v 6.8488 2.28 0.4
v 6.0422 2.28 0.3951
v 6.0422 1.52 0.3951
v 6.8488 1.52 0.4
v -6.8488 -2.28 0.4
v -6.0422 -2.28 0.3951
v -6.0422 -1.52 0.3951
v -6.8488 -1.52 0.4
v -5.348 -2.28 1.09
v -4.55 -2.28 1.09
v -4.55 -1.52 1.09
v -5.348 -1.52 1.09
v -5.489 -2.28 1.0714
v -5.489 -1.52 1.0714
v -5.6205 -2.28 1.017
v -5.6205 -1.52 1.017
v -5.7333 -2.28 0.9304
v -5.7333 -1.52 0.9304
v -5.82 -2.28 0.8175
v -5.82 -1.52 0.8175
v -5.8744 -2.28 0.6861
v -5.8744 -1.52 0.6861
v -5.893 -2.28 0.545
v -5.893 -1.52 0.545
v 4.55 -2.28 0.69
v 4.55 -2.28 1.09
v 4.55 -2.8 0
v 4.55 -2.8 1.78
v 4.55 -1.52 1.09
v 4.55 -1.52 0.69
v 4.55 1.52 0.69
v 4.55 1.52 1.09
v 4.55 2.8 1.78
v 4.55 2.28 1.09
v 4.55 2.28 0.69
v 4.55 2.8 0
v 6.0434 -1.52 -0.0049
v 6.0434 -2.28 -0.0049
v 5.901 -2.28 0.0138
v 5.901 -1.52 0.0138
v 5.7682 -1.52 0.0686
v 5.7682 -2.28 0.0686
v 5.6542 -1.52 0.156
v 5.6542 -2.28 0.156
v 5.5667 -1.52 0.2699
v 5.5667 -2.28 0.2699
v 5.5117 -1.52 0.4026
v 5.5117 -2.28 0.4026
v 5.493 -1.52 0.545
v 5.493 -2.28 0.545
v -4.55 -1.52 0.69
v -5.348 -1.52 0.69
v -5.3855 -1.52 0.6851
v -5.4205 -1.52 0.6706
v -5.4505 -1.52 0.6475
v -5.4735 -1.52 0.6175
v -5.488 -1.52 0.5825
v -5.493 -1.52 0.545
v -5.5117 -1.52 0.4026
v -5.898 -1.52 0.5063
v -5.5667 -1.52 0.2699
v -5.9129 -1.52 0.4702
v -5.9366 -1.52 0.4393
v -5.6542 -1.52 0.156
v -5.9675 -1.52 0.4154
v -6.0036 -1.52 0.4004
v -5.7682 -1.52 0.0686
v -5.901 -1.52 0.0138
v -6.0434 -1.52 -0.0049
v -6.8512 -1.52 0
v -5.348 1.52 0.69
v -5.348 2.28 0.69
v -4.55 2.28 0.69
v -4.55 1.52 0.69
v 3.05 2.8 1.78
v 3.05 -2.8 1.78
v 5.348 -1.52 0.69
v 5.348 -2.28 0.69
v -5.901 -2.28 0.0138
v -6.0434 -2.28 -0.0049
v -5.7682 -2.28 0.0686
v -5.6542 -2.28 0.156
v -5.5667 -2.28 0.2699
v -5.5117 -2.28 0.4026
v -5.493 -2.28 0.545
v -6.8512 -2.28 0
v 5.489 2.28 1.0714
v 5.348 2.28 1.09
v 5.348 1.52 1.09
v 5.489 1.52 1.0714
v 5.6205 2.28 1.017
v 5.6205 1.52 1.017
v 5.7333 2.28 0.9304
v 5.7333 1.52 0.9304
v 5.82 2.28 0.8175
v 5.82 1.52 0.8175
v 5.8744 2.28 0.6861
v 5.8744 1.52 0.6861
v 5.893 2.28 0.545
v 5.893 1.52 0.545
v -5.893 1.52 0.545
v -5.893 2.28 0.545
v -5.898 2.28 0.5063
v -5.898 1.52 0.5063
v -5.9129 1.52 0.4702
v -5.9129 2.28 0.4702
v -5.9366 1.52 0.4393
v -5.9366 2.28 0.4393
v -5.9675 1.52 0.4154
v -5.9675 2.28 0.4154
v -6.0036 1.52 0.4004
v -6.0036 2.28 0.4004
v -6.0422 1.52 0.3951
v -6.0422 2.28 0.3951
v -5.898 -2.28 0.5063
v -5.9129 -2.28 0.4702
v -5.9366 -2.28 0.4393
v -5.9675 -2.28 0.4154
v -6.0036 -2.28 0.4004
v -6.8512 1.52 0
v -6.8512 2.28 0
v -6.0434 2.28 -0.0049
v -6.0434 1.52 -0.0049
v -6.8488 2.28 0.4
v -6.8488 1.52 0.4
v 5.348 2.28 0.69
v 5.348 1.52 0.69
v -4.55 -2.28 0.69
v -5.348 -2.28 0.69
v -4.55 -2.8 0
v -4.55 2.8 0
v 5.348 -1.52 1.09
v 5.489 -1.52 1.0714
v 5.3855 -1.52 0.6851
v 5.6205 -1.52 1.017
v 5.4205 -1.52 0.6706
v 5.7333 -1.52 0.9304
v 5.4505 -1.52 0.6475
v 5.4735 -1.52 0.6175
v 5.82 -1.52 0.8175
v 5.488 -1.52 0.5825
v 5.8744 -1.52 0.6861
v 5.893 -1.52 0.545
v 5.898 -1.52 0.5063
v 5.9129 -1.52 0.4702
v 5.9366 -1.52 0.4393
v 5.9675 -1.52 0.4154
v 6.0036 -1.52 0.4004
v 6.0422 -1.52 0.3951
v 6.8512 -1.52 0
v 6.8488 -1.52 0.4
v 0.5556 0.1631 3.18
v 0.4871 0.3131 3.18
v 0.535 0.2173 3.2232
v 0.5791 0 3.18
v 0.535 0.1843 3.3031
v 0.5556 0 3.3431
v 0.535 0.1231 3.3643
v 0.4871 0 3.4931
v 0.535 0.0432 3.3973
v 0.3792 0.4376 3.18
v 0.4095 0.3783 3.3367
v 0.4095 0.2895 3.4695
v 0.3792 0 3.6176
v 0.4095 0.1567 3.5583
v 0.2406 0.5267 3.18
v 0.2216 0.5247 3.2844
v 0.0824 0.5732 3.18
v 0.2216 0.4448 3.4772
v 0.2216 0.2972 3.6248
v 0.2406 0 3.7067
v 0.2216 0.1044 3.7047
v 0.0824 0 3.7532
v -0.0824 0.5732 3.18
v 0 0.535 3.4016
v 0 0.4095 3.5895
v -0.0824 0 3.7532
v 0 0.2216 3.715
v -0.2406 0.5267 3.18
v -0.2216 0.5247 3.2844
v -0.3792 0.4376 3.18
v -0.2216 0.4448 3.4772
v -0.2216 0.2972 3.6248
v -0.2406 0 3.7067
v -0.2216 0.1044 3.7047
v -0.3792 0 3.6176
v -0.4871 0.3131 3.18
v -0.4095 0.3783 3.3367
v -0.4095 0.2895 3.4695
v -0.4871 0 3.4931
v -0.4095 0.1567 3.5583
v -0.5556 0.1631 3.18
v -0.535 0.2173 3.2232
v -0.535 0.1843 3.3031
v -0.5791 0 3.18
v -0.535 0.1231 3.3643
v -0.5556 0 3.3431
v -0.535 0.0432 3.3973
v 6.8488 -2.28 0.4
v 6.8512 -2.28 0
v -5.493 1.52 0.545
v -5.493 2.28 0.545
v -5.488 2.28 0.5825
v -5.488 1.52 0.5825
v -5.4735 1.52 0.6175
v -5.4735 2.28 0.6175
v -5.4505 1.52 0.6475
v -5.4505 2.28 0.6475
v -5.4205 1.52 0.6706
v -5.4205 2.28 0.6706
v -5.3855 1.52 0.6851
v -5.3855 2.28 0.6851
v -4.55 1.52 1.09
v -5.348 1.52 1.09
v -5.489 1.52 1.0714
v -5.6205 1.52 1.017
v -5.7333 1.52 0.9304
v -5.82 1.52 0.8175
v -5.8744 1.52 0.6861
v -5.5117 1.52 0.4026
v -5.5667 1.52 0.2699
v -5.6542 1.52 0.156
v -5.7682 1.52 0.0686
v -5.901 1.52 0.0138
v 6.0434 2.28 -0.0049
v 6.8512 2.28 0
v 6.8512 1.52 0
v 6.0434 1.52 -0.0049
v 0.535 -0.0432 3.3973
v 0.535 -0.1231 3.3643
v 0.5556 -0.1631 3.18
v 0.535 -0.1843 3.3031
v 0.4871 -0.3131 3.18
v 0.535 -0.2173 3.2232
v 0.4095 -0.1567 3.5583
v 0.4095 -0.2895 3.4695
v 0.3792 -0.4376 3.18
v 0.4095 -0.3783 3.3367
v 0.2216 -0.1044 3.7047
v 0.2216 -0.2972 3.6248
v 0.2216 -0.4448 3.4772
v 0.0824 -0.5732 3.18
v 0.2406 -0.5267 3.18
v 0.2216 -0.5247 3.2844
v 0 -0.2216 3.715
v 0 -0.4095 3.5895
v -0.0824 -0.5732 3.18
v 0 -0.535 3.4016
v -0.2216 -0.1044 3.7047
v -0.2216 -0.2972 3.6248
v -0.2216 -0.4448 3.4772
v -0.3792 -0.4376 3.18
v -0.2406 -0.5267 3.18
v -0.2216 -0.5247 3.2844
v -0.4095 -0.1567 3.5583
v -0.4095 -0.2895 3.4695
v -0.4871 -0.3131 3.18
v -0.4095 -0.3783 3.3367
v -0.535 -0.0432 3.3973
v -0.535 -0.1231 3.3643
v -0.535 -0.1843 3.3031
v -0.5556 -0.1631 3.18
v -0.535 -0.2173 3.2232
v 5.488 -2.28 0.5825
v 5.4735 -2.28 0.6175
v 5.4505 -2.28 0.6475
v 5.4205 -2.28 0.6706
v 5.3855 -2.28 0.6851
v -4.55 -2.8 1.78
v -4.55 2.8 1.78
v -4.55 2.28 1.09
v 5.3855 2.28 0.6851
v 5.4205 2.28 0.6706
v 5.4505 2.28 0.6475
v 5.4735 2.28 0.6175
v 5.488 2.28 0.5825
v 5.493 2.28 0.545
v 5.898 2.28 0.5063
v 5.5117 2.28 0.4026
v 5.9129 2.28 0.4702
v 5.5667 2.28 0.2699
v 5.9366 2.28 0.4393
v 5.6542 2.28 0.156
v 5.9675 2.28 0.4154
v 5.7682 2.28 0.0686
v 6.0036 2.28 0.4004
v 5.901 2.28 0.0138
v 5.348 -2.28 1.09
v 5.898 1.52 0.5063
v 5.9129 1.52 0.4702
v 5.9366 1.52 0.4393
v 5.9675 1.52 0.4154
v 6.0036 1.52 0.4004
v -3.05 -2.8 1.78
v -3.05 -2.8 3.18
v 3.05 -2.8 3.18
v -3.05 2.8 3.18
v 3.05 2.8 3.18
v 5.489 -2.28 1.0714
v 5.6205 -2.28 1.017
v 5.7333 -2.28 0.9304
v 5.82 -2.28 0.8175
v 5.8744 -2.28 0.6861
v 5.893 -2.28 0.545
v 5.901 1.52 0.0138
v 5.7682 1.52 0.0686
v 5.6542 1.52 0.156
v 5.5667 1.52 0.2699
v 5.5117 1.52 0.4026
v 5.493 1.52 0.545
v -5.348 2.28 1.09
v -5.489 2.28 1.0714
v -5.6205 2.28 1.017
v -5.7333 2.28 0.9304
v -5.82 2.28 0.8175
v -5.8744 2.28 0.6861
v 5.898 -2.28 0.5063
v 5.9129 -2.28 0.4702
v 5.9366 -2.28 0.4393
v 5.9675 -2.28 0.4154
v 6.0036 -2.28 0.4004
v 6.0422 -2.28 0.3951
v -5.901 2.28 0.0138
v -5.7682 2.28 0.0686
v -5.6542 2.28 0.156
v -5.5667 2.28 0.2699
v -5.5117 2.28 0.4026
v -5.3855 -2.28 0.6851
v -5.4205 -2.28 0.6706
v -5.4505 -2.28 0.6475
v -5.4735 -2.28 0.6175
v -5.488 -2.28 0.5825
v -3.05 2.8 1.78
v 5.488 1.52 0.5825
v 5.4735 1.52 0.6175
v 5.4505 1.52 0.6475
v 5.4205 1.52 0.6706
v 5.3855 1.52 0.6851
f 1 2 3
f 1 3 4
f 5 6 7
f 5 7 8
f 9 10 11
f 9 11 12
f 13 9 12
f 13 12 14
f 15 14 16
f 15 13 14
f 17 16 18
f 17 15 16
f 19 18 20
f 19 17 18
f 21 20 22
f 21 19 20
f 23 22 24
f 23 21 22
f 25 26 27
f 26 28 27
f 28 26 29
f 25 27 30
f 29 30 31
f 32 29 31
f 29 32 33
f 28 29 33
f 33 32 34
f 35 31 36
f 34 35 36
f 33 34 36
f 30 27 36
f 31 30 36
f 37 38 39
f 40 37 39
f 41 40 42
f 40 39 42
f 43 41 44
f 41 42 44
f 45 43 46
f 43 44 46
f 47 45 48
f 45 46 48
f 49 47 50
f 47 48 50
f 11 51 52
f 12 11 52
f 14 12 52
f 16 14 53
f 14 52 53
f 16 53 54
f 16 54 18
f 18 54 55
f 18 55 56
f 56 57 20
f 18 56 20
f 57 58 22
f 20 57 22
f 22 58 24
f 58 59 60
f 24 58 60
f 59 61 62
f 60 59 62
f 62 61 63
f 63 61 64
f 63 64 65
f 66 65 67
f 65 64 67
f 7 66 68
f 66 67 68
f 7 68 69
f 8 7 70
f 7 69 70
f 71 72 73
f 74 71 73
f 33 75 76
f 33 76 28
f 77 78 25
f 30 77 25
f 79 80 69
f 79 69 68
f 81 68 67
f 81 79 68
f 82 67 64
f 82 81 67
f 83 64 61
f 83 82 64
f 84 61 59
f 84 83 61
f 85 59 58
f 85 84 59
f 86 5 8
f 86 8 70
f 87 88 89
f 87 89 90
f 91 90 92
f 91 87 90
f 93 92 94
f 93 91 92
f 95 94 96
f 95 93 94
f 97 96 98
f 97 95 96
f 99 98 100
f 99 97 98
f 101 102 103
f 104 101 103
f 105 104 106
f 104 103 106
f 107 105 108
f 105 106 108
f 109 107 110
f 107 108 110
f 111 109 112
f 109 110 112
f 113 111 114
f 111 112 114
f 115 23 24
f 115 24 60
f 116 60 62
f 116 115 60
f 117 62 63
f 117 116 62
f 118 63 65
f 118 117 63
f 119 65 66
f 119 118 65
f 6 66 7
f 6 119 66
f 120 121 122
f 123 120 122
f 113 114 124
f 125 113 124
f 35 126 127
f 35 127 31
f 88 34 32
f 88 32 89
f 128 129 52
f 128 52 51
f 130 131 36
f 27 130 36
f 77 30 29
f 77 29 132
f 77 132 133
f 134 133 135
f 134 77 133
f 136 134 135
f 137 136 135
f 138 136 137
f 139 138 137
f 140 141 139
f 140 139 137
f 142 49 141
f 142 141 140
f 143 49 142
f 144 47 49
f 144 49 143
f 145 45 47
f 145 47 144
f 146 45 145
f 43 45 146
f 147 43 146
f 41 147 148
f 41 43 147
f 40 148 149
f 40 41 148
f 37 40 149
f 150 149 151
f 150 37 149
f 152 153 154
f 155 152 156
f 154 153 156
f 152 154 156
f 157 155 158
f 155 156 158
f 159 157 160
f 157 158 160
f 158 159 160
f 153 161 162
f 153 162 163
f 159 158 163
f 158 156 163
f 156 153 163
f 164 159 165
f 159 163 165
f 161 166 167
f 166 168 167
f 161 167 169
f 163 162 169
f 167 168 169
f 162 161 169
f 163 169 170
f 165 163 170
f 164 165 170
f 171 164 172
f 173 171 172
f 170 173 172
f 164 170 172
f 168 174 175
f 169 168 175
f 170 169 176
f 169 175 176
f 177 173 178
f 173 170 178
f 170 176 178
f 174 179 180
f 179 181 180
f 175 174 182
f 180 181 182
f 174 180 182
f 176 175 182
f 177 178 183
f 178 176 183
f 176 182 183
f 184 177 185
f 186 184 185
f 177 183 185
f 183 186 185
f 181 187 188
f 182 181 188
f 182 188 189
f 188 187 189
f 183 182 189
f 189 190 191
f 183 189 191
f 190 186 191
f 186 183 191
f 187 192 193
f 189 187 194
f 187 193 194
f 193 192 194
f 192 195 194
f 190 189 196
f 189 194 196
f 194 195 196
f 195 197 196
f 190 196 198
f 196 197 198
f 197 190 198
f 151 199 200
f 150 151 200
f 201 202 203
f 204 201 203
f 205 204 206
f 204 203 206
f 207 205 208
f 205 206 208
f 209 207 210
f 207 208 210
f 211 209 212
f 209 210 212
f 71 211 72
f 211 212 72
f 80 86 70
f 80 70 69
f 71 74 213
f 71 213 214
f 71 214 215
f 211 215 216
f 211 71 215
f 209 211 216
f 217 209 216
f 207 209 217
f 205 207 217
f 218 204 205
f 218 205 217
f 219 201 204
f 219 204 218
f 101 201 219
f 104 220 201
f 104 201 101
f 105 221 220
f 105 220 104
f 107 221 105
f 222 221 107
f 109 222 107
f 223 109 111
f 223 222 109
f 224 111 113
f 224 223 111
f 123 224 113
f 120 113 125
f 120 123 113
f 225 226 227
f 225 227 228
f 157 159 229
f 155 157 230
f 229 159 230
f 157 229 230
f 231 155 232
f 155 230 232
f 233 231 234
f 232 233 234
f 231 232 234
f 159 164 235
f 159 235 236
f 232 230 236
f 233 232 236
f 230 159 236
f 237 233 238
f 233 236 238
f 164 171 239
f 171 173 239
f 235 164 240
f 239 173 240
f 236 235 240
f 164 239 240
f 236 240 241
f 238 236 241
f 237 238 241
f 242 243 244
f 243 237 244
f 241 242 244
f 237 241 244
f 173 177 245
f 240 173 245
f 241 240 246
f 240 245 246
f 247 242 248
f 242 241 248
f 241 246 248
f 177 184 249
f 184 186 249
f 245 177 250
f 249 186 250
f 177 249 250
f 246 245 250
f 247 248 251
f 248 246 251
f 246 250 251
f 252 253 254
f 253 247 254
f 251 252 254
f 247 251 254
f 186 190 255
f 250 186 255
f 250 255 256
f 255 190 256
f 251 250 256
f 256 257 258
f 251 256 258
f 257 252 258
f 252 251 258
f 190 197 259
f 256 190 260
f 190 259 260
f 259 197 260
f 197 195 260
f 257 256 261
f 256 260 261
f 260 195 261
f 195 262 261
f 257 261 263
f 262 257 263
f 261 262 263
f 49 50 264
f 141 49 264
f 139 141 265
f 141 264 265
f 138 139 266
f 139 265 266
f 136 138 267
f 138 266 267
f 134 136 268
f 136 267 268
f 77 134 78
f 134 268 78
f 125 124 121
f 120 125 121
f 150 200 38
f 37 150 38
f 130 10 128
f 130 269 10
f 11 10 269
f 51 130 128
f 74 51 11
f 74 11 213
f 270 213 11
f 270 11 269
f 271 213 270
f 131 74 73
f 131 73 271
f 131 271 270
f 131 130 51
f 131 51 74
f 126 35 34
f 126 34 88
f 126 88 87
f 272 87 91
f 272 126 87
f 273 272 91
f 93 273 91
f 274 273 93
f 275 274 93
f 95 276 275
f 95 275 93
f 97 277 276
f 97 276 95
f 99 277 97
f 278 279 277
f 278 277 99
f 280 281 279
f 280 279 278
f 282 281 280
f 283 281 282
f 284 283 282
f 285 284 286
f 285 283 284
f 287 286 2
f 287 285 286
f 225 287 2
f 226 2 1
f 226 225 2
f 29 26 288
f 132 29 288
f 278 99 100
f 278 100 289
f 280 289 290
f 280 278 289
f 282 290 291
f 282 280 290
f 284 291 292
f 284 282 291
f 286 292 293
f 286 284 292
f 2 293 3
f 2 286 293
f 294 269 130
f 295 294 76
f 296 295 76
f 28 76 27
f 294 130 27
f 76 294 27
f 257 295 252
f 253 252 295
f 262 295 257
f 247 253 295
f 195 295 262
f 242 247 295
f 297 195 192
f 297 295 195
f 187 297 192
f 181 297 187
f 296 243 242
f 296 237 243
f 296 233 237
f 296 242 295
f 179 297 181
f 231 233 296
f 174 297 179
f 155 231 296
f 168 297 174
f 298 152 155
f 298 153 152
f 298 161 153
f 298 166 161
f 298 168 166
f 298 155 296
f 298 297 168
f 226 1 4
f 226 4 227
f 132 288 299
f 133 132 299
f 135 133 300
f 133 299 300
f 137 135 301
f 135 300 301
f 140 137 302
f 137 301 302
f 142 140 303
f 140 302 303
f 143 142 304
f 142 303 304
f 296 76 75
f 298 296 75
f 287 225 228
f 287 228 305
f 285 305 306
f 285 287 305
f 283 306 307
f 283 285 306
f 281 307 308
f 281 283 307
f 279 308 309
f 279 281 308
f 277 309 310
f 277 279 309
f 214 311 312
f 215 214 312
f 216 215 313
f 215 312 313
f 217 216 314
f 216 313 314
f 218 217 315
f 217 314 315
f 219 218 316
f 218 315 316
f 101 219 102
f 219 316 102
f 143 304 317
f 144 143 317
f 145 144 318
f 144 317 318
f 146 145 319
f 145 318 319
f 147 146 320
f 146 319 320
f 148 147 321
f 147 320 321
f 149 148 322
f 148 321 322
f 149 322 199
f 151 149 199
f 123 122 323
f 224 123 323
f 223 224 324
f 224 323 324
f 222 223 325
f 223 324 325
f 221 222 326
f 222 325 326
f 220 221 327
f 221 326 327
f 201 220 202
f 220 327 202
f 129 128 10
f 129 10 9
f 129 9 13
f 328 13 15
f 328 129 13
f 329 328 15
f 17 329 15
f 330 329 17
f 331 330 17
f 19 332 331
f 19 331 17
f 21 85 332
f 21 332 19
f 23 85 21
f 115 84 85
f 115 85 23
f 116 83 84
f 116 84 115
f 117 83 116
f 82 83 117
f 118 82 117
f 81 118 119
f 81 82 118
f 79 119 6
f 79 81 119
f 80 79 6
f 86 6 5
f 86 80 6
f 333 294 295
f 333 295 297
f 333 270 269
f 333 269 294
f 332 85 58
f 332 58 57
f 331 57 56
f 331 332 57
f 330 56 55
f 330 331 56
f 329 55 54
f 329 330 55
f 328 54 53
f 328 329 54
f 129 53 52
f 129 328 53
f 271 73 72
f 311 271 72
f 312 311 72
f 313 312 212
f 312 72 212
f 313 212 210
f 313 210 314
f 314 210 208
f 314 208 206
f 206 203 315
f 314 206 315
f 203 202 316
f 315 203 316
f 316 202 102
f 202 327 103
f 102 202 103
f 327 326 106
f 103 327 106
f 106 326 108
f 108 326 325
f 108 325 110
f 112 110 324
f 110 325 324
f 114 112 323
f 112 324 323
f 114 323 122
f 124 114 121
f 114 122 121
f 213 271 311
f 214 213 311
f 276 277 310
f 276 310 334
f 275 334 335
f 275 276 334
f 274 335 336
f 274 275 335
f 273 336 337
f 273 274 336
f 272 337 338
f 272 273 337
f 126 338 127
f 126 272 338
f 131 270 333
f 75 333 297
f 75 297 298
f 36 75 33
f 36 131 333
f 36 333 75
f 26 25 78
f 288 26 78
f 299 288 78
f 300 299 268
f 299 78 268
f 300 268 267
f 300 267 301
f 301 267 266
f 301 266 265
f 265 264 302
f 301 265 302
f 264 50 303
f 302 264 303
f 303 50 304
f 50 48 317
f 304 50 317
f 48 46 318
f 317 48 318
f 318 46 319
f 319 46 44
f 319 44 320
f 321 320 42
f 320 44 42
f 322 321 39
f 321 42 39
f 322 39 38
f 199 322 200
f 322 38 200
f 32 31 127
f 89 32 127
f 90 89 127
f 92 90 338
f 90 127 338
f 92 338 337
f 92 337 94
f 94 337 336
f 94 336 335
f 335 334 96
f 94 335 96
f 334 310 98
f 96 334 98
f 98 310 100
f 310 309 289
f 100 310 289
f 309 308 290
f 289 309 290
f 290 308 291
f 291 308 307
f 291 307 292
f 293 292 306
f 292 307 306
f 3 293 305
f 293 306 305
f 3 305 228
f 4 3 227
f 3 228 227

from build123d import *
from build123d.topology import SkipClean

# Parameters (mm, degrees)
SKETCH_1_W            = 9.1
SKETCH_1_H            = 5.6
EXTRUDE_1_DEPTH       = 1.78
SKETCH_2_W            = 6.1
SKETCH_2_H            = 5.6
EXTRUDE_2_DEPTH       = 1.4
SWEEP_START           = -2.28
SWEEP_2_DEPTH         = 0.76
MIRROR_START          = -2.28
MIRROR_2_COPY_1_DEPTH = 0.76


# Read off the part's stored shape, not the designer's step: 스윕2
with BuildPart() as part:
    # 스케치1 → 보스-돌출1 (new body)
    with BuildSketch(Plane.XY):
        Rectangle(SKETCH_1_W, SKETCH_1_H)
    extrude(amount=EXTRUDE_1_DEPTH)

    # 스케치2 → 보스-돌출2 (add)
    with BuildSketch(Plane.XY.offset(1.78)):
        Rectangle(SKETCH_2_W, SKETCH_2_H)
    extrude(amount=EXTRUDE_2_DEPTH)

    # 스케치3 → 회전1 (revolve)
    with SkipClean():  # the faces are left unmerged after this step: merging them gives an invalid solid
        with BuildSketch(Plane(origin=(0, 0, 0), x_dir=(1, 0, 0), z_dir=(0, 1, 0))):
            with BuildLine():
                Line((-0.579062876, -3.18), (0.579062876, -3.18))
                ThreePointArc((0.579062876, -3.18), (0, -3.759062876), (-0.579062876, -3.18))
            make_face()
        revolve(axis=Axis((-0.579062876, 0, 3.18), (1, 0, 0)))

    # 스윕2 outline → 스윕2 (add)
    with SkipClean():  # the faces are left unmerged after this step: merging them gives an invalid solid
        with BuildSketch(Plane(origin=(0, 0, 0), x_dir=(1, 0, 0), z_dir=(0, 1, 0)).offset(SWEEP_START)):
            with BuildLine():
                Line((6.848797328, -0.399996384), (6.851202672, -3.616e-06))
                Line((6.851202672, -3.616e-06), (6.043424326, 0.004853607))
                ThreePointArc((6.043424326, 0.004853607), (5.654230205, -0.155982007), (5.492969053, -0.545))
                ThreePointArc((5.492969053, -0.545), (5.450499536, -0.647530483), (5.347969053, -0.69))
                Line((5.347969053, -0.69), (4.55, -0.69))
                Line((4.55, -0.69), (4.55, -1.09))
                Line((4.55, -1.09), (5.347969053, -1.09))
                ThreePointArc((5.347969053, -1.09), (5.733342249, -0.930373196), (5.892969053, -0.545))
                ThreePointArc((5.892969053, -0.545), (5.936647868, -0.439250079), (6.042221667, -0.395147271))
                Line((6.042221667, -0.395147271), (6.848797328, -0.399996384))
            make_face()
        sweep_2 = extrude(amount=SWEEP_2_DEPTH)

    # 대칭 복사1: 스윕2 across plane
    with SkipClean():  # the faces are left unmerged after this step: merging them gives an invalid solid
        add(sweep_2.mirror(Plane.ZX))

    # 대칭 복사2: 스윕2 across plane
    with SkipClean():  # the faces are left unmerged after this step: merging them gives an invalid solid
        add(sweep_2.mirror(Plane(origin=(0, 0, 0), x_dir=(0, 0, 1), z_dir=(1, 0, 0))))

    # 대칭 복사2 copy 1 sketch → 대칭 복사2 copy 1 (add)
    with SkipClean():  # the faces are left unmerged after this step: merging them gives an invalid solid
        with BuildSketch(Plane(origin=(0, 0, 0), x_dir=(-1, 0, 0), z_dir=(0, -1, 0)).offset(MIRROR_START)):
            with BuildLine():
                Line((6.848797328, -0.399996384), (6.851202672, -3.616e-06))
                Line((6.851202672, -3.616e-06), (6.043424326, 0.004853607))
                ThreePointArc((6.043424326, 0.004853607), (5.654230205, -0.155982007), (5.492969053, -0.545))
                ThreePointArc((5.492969053, -0.545), (5.450499536, -0.647530483), (5.347969053, -0.69))
                Line((5.347969053, -0.69), (4.55, -0.69))
                Line((4.55, -0.69), (4.55, -1.09))
                Line((4.55, -1.09), (5.347969053, -1.09))
                ThreePointArc((5.347969053, -1.09), (5.733342249, -0.930373196), (5.892969053, -0.545))
                ThreePointArc((5.892969053, -0.545), (5.936647868, -0.439250079), (6.042221667, -0.395147271))
                Line((6.042221667, -0.395147271), (6.848797328, -0.399996384))
            make_face()
        extrude(amount=MIRROR_2_COPY_1_DEPTH)


solid = part.part
